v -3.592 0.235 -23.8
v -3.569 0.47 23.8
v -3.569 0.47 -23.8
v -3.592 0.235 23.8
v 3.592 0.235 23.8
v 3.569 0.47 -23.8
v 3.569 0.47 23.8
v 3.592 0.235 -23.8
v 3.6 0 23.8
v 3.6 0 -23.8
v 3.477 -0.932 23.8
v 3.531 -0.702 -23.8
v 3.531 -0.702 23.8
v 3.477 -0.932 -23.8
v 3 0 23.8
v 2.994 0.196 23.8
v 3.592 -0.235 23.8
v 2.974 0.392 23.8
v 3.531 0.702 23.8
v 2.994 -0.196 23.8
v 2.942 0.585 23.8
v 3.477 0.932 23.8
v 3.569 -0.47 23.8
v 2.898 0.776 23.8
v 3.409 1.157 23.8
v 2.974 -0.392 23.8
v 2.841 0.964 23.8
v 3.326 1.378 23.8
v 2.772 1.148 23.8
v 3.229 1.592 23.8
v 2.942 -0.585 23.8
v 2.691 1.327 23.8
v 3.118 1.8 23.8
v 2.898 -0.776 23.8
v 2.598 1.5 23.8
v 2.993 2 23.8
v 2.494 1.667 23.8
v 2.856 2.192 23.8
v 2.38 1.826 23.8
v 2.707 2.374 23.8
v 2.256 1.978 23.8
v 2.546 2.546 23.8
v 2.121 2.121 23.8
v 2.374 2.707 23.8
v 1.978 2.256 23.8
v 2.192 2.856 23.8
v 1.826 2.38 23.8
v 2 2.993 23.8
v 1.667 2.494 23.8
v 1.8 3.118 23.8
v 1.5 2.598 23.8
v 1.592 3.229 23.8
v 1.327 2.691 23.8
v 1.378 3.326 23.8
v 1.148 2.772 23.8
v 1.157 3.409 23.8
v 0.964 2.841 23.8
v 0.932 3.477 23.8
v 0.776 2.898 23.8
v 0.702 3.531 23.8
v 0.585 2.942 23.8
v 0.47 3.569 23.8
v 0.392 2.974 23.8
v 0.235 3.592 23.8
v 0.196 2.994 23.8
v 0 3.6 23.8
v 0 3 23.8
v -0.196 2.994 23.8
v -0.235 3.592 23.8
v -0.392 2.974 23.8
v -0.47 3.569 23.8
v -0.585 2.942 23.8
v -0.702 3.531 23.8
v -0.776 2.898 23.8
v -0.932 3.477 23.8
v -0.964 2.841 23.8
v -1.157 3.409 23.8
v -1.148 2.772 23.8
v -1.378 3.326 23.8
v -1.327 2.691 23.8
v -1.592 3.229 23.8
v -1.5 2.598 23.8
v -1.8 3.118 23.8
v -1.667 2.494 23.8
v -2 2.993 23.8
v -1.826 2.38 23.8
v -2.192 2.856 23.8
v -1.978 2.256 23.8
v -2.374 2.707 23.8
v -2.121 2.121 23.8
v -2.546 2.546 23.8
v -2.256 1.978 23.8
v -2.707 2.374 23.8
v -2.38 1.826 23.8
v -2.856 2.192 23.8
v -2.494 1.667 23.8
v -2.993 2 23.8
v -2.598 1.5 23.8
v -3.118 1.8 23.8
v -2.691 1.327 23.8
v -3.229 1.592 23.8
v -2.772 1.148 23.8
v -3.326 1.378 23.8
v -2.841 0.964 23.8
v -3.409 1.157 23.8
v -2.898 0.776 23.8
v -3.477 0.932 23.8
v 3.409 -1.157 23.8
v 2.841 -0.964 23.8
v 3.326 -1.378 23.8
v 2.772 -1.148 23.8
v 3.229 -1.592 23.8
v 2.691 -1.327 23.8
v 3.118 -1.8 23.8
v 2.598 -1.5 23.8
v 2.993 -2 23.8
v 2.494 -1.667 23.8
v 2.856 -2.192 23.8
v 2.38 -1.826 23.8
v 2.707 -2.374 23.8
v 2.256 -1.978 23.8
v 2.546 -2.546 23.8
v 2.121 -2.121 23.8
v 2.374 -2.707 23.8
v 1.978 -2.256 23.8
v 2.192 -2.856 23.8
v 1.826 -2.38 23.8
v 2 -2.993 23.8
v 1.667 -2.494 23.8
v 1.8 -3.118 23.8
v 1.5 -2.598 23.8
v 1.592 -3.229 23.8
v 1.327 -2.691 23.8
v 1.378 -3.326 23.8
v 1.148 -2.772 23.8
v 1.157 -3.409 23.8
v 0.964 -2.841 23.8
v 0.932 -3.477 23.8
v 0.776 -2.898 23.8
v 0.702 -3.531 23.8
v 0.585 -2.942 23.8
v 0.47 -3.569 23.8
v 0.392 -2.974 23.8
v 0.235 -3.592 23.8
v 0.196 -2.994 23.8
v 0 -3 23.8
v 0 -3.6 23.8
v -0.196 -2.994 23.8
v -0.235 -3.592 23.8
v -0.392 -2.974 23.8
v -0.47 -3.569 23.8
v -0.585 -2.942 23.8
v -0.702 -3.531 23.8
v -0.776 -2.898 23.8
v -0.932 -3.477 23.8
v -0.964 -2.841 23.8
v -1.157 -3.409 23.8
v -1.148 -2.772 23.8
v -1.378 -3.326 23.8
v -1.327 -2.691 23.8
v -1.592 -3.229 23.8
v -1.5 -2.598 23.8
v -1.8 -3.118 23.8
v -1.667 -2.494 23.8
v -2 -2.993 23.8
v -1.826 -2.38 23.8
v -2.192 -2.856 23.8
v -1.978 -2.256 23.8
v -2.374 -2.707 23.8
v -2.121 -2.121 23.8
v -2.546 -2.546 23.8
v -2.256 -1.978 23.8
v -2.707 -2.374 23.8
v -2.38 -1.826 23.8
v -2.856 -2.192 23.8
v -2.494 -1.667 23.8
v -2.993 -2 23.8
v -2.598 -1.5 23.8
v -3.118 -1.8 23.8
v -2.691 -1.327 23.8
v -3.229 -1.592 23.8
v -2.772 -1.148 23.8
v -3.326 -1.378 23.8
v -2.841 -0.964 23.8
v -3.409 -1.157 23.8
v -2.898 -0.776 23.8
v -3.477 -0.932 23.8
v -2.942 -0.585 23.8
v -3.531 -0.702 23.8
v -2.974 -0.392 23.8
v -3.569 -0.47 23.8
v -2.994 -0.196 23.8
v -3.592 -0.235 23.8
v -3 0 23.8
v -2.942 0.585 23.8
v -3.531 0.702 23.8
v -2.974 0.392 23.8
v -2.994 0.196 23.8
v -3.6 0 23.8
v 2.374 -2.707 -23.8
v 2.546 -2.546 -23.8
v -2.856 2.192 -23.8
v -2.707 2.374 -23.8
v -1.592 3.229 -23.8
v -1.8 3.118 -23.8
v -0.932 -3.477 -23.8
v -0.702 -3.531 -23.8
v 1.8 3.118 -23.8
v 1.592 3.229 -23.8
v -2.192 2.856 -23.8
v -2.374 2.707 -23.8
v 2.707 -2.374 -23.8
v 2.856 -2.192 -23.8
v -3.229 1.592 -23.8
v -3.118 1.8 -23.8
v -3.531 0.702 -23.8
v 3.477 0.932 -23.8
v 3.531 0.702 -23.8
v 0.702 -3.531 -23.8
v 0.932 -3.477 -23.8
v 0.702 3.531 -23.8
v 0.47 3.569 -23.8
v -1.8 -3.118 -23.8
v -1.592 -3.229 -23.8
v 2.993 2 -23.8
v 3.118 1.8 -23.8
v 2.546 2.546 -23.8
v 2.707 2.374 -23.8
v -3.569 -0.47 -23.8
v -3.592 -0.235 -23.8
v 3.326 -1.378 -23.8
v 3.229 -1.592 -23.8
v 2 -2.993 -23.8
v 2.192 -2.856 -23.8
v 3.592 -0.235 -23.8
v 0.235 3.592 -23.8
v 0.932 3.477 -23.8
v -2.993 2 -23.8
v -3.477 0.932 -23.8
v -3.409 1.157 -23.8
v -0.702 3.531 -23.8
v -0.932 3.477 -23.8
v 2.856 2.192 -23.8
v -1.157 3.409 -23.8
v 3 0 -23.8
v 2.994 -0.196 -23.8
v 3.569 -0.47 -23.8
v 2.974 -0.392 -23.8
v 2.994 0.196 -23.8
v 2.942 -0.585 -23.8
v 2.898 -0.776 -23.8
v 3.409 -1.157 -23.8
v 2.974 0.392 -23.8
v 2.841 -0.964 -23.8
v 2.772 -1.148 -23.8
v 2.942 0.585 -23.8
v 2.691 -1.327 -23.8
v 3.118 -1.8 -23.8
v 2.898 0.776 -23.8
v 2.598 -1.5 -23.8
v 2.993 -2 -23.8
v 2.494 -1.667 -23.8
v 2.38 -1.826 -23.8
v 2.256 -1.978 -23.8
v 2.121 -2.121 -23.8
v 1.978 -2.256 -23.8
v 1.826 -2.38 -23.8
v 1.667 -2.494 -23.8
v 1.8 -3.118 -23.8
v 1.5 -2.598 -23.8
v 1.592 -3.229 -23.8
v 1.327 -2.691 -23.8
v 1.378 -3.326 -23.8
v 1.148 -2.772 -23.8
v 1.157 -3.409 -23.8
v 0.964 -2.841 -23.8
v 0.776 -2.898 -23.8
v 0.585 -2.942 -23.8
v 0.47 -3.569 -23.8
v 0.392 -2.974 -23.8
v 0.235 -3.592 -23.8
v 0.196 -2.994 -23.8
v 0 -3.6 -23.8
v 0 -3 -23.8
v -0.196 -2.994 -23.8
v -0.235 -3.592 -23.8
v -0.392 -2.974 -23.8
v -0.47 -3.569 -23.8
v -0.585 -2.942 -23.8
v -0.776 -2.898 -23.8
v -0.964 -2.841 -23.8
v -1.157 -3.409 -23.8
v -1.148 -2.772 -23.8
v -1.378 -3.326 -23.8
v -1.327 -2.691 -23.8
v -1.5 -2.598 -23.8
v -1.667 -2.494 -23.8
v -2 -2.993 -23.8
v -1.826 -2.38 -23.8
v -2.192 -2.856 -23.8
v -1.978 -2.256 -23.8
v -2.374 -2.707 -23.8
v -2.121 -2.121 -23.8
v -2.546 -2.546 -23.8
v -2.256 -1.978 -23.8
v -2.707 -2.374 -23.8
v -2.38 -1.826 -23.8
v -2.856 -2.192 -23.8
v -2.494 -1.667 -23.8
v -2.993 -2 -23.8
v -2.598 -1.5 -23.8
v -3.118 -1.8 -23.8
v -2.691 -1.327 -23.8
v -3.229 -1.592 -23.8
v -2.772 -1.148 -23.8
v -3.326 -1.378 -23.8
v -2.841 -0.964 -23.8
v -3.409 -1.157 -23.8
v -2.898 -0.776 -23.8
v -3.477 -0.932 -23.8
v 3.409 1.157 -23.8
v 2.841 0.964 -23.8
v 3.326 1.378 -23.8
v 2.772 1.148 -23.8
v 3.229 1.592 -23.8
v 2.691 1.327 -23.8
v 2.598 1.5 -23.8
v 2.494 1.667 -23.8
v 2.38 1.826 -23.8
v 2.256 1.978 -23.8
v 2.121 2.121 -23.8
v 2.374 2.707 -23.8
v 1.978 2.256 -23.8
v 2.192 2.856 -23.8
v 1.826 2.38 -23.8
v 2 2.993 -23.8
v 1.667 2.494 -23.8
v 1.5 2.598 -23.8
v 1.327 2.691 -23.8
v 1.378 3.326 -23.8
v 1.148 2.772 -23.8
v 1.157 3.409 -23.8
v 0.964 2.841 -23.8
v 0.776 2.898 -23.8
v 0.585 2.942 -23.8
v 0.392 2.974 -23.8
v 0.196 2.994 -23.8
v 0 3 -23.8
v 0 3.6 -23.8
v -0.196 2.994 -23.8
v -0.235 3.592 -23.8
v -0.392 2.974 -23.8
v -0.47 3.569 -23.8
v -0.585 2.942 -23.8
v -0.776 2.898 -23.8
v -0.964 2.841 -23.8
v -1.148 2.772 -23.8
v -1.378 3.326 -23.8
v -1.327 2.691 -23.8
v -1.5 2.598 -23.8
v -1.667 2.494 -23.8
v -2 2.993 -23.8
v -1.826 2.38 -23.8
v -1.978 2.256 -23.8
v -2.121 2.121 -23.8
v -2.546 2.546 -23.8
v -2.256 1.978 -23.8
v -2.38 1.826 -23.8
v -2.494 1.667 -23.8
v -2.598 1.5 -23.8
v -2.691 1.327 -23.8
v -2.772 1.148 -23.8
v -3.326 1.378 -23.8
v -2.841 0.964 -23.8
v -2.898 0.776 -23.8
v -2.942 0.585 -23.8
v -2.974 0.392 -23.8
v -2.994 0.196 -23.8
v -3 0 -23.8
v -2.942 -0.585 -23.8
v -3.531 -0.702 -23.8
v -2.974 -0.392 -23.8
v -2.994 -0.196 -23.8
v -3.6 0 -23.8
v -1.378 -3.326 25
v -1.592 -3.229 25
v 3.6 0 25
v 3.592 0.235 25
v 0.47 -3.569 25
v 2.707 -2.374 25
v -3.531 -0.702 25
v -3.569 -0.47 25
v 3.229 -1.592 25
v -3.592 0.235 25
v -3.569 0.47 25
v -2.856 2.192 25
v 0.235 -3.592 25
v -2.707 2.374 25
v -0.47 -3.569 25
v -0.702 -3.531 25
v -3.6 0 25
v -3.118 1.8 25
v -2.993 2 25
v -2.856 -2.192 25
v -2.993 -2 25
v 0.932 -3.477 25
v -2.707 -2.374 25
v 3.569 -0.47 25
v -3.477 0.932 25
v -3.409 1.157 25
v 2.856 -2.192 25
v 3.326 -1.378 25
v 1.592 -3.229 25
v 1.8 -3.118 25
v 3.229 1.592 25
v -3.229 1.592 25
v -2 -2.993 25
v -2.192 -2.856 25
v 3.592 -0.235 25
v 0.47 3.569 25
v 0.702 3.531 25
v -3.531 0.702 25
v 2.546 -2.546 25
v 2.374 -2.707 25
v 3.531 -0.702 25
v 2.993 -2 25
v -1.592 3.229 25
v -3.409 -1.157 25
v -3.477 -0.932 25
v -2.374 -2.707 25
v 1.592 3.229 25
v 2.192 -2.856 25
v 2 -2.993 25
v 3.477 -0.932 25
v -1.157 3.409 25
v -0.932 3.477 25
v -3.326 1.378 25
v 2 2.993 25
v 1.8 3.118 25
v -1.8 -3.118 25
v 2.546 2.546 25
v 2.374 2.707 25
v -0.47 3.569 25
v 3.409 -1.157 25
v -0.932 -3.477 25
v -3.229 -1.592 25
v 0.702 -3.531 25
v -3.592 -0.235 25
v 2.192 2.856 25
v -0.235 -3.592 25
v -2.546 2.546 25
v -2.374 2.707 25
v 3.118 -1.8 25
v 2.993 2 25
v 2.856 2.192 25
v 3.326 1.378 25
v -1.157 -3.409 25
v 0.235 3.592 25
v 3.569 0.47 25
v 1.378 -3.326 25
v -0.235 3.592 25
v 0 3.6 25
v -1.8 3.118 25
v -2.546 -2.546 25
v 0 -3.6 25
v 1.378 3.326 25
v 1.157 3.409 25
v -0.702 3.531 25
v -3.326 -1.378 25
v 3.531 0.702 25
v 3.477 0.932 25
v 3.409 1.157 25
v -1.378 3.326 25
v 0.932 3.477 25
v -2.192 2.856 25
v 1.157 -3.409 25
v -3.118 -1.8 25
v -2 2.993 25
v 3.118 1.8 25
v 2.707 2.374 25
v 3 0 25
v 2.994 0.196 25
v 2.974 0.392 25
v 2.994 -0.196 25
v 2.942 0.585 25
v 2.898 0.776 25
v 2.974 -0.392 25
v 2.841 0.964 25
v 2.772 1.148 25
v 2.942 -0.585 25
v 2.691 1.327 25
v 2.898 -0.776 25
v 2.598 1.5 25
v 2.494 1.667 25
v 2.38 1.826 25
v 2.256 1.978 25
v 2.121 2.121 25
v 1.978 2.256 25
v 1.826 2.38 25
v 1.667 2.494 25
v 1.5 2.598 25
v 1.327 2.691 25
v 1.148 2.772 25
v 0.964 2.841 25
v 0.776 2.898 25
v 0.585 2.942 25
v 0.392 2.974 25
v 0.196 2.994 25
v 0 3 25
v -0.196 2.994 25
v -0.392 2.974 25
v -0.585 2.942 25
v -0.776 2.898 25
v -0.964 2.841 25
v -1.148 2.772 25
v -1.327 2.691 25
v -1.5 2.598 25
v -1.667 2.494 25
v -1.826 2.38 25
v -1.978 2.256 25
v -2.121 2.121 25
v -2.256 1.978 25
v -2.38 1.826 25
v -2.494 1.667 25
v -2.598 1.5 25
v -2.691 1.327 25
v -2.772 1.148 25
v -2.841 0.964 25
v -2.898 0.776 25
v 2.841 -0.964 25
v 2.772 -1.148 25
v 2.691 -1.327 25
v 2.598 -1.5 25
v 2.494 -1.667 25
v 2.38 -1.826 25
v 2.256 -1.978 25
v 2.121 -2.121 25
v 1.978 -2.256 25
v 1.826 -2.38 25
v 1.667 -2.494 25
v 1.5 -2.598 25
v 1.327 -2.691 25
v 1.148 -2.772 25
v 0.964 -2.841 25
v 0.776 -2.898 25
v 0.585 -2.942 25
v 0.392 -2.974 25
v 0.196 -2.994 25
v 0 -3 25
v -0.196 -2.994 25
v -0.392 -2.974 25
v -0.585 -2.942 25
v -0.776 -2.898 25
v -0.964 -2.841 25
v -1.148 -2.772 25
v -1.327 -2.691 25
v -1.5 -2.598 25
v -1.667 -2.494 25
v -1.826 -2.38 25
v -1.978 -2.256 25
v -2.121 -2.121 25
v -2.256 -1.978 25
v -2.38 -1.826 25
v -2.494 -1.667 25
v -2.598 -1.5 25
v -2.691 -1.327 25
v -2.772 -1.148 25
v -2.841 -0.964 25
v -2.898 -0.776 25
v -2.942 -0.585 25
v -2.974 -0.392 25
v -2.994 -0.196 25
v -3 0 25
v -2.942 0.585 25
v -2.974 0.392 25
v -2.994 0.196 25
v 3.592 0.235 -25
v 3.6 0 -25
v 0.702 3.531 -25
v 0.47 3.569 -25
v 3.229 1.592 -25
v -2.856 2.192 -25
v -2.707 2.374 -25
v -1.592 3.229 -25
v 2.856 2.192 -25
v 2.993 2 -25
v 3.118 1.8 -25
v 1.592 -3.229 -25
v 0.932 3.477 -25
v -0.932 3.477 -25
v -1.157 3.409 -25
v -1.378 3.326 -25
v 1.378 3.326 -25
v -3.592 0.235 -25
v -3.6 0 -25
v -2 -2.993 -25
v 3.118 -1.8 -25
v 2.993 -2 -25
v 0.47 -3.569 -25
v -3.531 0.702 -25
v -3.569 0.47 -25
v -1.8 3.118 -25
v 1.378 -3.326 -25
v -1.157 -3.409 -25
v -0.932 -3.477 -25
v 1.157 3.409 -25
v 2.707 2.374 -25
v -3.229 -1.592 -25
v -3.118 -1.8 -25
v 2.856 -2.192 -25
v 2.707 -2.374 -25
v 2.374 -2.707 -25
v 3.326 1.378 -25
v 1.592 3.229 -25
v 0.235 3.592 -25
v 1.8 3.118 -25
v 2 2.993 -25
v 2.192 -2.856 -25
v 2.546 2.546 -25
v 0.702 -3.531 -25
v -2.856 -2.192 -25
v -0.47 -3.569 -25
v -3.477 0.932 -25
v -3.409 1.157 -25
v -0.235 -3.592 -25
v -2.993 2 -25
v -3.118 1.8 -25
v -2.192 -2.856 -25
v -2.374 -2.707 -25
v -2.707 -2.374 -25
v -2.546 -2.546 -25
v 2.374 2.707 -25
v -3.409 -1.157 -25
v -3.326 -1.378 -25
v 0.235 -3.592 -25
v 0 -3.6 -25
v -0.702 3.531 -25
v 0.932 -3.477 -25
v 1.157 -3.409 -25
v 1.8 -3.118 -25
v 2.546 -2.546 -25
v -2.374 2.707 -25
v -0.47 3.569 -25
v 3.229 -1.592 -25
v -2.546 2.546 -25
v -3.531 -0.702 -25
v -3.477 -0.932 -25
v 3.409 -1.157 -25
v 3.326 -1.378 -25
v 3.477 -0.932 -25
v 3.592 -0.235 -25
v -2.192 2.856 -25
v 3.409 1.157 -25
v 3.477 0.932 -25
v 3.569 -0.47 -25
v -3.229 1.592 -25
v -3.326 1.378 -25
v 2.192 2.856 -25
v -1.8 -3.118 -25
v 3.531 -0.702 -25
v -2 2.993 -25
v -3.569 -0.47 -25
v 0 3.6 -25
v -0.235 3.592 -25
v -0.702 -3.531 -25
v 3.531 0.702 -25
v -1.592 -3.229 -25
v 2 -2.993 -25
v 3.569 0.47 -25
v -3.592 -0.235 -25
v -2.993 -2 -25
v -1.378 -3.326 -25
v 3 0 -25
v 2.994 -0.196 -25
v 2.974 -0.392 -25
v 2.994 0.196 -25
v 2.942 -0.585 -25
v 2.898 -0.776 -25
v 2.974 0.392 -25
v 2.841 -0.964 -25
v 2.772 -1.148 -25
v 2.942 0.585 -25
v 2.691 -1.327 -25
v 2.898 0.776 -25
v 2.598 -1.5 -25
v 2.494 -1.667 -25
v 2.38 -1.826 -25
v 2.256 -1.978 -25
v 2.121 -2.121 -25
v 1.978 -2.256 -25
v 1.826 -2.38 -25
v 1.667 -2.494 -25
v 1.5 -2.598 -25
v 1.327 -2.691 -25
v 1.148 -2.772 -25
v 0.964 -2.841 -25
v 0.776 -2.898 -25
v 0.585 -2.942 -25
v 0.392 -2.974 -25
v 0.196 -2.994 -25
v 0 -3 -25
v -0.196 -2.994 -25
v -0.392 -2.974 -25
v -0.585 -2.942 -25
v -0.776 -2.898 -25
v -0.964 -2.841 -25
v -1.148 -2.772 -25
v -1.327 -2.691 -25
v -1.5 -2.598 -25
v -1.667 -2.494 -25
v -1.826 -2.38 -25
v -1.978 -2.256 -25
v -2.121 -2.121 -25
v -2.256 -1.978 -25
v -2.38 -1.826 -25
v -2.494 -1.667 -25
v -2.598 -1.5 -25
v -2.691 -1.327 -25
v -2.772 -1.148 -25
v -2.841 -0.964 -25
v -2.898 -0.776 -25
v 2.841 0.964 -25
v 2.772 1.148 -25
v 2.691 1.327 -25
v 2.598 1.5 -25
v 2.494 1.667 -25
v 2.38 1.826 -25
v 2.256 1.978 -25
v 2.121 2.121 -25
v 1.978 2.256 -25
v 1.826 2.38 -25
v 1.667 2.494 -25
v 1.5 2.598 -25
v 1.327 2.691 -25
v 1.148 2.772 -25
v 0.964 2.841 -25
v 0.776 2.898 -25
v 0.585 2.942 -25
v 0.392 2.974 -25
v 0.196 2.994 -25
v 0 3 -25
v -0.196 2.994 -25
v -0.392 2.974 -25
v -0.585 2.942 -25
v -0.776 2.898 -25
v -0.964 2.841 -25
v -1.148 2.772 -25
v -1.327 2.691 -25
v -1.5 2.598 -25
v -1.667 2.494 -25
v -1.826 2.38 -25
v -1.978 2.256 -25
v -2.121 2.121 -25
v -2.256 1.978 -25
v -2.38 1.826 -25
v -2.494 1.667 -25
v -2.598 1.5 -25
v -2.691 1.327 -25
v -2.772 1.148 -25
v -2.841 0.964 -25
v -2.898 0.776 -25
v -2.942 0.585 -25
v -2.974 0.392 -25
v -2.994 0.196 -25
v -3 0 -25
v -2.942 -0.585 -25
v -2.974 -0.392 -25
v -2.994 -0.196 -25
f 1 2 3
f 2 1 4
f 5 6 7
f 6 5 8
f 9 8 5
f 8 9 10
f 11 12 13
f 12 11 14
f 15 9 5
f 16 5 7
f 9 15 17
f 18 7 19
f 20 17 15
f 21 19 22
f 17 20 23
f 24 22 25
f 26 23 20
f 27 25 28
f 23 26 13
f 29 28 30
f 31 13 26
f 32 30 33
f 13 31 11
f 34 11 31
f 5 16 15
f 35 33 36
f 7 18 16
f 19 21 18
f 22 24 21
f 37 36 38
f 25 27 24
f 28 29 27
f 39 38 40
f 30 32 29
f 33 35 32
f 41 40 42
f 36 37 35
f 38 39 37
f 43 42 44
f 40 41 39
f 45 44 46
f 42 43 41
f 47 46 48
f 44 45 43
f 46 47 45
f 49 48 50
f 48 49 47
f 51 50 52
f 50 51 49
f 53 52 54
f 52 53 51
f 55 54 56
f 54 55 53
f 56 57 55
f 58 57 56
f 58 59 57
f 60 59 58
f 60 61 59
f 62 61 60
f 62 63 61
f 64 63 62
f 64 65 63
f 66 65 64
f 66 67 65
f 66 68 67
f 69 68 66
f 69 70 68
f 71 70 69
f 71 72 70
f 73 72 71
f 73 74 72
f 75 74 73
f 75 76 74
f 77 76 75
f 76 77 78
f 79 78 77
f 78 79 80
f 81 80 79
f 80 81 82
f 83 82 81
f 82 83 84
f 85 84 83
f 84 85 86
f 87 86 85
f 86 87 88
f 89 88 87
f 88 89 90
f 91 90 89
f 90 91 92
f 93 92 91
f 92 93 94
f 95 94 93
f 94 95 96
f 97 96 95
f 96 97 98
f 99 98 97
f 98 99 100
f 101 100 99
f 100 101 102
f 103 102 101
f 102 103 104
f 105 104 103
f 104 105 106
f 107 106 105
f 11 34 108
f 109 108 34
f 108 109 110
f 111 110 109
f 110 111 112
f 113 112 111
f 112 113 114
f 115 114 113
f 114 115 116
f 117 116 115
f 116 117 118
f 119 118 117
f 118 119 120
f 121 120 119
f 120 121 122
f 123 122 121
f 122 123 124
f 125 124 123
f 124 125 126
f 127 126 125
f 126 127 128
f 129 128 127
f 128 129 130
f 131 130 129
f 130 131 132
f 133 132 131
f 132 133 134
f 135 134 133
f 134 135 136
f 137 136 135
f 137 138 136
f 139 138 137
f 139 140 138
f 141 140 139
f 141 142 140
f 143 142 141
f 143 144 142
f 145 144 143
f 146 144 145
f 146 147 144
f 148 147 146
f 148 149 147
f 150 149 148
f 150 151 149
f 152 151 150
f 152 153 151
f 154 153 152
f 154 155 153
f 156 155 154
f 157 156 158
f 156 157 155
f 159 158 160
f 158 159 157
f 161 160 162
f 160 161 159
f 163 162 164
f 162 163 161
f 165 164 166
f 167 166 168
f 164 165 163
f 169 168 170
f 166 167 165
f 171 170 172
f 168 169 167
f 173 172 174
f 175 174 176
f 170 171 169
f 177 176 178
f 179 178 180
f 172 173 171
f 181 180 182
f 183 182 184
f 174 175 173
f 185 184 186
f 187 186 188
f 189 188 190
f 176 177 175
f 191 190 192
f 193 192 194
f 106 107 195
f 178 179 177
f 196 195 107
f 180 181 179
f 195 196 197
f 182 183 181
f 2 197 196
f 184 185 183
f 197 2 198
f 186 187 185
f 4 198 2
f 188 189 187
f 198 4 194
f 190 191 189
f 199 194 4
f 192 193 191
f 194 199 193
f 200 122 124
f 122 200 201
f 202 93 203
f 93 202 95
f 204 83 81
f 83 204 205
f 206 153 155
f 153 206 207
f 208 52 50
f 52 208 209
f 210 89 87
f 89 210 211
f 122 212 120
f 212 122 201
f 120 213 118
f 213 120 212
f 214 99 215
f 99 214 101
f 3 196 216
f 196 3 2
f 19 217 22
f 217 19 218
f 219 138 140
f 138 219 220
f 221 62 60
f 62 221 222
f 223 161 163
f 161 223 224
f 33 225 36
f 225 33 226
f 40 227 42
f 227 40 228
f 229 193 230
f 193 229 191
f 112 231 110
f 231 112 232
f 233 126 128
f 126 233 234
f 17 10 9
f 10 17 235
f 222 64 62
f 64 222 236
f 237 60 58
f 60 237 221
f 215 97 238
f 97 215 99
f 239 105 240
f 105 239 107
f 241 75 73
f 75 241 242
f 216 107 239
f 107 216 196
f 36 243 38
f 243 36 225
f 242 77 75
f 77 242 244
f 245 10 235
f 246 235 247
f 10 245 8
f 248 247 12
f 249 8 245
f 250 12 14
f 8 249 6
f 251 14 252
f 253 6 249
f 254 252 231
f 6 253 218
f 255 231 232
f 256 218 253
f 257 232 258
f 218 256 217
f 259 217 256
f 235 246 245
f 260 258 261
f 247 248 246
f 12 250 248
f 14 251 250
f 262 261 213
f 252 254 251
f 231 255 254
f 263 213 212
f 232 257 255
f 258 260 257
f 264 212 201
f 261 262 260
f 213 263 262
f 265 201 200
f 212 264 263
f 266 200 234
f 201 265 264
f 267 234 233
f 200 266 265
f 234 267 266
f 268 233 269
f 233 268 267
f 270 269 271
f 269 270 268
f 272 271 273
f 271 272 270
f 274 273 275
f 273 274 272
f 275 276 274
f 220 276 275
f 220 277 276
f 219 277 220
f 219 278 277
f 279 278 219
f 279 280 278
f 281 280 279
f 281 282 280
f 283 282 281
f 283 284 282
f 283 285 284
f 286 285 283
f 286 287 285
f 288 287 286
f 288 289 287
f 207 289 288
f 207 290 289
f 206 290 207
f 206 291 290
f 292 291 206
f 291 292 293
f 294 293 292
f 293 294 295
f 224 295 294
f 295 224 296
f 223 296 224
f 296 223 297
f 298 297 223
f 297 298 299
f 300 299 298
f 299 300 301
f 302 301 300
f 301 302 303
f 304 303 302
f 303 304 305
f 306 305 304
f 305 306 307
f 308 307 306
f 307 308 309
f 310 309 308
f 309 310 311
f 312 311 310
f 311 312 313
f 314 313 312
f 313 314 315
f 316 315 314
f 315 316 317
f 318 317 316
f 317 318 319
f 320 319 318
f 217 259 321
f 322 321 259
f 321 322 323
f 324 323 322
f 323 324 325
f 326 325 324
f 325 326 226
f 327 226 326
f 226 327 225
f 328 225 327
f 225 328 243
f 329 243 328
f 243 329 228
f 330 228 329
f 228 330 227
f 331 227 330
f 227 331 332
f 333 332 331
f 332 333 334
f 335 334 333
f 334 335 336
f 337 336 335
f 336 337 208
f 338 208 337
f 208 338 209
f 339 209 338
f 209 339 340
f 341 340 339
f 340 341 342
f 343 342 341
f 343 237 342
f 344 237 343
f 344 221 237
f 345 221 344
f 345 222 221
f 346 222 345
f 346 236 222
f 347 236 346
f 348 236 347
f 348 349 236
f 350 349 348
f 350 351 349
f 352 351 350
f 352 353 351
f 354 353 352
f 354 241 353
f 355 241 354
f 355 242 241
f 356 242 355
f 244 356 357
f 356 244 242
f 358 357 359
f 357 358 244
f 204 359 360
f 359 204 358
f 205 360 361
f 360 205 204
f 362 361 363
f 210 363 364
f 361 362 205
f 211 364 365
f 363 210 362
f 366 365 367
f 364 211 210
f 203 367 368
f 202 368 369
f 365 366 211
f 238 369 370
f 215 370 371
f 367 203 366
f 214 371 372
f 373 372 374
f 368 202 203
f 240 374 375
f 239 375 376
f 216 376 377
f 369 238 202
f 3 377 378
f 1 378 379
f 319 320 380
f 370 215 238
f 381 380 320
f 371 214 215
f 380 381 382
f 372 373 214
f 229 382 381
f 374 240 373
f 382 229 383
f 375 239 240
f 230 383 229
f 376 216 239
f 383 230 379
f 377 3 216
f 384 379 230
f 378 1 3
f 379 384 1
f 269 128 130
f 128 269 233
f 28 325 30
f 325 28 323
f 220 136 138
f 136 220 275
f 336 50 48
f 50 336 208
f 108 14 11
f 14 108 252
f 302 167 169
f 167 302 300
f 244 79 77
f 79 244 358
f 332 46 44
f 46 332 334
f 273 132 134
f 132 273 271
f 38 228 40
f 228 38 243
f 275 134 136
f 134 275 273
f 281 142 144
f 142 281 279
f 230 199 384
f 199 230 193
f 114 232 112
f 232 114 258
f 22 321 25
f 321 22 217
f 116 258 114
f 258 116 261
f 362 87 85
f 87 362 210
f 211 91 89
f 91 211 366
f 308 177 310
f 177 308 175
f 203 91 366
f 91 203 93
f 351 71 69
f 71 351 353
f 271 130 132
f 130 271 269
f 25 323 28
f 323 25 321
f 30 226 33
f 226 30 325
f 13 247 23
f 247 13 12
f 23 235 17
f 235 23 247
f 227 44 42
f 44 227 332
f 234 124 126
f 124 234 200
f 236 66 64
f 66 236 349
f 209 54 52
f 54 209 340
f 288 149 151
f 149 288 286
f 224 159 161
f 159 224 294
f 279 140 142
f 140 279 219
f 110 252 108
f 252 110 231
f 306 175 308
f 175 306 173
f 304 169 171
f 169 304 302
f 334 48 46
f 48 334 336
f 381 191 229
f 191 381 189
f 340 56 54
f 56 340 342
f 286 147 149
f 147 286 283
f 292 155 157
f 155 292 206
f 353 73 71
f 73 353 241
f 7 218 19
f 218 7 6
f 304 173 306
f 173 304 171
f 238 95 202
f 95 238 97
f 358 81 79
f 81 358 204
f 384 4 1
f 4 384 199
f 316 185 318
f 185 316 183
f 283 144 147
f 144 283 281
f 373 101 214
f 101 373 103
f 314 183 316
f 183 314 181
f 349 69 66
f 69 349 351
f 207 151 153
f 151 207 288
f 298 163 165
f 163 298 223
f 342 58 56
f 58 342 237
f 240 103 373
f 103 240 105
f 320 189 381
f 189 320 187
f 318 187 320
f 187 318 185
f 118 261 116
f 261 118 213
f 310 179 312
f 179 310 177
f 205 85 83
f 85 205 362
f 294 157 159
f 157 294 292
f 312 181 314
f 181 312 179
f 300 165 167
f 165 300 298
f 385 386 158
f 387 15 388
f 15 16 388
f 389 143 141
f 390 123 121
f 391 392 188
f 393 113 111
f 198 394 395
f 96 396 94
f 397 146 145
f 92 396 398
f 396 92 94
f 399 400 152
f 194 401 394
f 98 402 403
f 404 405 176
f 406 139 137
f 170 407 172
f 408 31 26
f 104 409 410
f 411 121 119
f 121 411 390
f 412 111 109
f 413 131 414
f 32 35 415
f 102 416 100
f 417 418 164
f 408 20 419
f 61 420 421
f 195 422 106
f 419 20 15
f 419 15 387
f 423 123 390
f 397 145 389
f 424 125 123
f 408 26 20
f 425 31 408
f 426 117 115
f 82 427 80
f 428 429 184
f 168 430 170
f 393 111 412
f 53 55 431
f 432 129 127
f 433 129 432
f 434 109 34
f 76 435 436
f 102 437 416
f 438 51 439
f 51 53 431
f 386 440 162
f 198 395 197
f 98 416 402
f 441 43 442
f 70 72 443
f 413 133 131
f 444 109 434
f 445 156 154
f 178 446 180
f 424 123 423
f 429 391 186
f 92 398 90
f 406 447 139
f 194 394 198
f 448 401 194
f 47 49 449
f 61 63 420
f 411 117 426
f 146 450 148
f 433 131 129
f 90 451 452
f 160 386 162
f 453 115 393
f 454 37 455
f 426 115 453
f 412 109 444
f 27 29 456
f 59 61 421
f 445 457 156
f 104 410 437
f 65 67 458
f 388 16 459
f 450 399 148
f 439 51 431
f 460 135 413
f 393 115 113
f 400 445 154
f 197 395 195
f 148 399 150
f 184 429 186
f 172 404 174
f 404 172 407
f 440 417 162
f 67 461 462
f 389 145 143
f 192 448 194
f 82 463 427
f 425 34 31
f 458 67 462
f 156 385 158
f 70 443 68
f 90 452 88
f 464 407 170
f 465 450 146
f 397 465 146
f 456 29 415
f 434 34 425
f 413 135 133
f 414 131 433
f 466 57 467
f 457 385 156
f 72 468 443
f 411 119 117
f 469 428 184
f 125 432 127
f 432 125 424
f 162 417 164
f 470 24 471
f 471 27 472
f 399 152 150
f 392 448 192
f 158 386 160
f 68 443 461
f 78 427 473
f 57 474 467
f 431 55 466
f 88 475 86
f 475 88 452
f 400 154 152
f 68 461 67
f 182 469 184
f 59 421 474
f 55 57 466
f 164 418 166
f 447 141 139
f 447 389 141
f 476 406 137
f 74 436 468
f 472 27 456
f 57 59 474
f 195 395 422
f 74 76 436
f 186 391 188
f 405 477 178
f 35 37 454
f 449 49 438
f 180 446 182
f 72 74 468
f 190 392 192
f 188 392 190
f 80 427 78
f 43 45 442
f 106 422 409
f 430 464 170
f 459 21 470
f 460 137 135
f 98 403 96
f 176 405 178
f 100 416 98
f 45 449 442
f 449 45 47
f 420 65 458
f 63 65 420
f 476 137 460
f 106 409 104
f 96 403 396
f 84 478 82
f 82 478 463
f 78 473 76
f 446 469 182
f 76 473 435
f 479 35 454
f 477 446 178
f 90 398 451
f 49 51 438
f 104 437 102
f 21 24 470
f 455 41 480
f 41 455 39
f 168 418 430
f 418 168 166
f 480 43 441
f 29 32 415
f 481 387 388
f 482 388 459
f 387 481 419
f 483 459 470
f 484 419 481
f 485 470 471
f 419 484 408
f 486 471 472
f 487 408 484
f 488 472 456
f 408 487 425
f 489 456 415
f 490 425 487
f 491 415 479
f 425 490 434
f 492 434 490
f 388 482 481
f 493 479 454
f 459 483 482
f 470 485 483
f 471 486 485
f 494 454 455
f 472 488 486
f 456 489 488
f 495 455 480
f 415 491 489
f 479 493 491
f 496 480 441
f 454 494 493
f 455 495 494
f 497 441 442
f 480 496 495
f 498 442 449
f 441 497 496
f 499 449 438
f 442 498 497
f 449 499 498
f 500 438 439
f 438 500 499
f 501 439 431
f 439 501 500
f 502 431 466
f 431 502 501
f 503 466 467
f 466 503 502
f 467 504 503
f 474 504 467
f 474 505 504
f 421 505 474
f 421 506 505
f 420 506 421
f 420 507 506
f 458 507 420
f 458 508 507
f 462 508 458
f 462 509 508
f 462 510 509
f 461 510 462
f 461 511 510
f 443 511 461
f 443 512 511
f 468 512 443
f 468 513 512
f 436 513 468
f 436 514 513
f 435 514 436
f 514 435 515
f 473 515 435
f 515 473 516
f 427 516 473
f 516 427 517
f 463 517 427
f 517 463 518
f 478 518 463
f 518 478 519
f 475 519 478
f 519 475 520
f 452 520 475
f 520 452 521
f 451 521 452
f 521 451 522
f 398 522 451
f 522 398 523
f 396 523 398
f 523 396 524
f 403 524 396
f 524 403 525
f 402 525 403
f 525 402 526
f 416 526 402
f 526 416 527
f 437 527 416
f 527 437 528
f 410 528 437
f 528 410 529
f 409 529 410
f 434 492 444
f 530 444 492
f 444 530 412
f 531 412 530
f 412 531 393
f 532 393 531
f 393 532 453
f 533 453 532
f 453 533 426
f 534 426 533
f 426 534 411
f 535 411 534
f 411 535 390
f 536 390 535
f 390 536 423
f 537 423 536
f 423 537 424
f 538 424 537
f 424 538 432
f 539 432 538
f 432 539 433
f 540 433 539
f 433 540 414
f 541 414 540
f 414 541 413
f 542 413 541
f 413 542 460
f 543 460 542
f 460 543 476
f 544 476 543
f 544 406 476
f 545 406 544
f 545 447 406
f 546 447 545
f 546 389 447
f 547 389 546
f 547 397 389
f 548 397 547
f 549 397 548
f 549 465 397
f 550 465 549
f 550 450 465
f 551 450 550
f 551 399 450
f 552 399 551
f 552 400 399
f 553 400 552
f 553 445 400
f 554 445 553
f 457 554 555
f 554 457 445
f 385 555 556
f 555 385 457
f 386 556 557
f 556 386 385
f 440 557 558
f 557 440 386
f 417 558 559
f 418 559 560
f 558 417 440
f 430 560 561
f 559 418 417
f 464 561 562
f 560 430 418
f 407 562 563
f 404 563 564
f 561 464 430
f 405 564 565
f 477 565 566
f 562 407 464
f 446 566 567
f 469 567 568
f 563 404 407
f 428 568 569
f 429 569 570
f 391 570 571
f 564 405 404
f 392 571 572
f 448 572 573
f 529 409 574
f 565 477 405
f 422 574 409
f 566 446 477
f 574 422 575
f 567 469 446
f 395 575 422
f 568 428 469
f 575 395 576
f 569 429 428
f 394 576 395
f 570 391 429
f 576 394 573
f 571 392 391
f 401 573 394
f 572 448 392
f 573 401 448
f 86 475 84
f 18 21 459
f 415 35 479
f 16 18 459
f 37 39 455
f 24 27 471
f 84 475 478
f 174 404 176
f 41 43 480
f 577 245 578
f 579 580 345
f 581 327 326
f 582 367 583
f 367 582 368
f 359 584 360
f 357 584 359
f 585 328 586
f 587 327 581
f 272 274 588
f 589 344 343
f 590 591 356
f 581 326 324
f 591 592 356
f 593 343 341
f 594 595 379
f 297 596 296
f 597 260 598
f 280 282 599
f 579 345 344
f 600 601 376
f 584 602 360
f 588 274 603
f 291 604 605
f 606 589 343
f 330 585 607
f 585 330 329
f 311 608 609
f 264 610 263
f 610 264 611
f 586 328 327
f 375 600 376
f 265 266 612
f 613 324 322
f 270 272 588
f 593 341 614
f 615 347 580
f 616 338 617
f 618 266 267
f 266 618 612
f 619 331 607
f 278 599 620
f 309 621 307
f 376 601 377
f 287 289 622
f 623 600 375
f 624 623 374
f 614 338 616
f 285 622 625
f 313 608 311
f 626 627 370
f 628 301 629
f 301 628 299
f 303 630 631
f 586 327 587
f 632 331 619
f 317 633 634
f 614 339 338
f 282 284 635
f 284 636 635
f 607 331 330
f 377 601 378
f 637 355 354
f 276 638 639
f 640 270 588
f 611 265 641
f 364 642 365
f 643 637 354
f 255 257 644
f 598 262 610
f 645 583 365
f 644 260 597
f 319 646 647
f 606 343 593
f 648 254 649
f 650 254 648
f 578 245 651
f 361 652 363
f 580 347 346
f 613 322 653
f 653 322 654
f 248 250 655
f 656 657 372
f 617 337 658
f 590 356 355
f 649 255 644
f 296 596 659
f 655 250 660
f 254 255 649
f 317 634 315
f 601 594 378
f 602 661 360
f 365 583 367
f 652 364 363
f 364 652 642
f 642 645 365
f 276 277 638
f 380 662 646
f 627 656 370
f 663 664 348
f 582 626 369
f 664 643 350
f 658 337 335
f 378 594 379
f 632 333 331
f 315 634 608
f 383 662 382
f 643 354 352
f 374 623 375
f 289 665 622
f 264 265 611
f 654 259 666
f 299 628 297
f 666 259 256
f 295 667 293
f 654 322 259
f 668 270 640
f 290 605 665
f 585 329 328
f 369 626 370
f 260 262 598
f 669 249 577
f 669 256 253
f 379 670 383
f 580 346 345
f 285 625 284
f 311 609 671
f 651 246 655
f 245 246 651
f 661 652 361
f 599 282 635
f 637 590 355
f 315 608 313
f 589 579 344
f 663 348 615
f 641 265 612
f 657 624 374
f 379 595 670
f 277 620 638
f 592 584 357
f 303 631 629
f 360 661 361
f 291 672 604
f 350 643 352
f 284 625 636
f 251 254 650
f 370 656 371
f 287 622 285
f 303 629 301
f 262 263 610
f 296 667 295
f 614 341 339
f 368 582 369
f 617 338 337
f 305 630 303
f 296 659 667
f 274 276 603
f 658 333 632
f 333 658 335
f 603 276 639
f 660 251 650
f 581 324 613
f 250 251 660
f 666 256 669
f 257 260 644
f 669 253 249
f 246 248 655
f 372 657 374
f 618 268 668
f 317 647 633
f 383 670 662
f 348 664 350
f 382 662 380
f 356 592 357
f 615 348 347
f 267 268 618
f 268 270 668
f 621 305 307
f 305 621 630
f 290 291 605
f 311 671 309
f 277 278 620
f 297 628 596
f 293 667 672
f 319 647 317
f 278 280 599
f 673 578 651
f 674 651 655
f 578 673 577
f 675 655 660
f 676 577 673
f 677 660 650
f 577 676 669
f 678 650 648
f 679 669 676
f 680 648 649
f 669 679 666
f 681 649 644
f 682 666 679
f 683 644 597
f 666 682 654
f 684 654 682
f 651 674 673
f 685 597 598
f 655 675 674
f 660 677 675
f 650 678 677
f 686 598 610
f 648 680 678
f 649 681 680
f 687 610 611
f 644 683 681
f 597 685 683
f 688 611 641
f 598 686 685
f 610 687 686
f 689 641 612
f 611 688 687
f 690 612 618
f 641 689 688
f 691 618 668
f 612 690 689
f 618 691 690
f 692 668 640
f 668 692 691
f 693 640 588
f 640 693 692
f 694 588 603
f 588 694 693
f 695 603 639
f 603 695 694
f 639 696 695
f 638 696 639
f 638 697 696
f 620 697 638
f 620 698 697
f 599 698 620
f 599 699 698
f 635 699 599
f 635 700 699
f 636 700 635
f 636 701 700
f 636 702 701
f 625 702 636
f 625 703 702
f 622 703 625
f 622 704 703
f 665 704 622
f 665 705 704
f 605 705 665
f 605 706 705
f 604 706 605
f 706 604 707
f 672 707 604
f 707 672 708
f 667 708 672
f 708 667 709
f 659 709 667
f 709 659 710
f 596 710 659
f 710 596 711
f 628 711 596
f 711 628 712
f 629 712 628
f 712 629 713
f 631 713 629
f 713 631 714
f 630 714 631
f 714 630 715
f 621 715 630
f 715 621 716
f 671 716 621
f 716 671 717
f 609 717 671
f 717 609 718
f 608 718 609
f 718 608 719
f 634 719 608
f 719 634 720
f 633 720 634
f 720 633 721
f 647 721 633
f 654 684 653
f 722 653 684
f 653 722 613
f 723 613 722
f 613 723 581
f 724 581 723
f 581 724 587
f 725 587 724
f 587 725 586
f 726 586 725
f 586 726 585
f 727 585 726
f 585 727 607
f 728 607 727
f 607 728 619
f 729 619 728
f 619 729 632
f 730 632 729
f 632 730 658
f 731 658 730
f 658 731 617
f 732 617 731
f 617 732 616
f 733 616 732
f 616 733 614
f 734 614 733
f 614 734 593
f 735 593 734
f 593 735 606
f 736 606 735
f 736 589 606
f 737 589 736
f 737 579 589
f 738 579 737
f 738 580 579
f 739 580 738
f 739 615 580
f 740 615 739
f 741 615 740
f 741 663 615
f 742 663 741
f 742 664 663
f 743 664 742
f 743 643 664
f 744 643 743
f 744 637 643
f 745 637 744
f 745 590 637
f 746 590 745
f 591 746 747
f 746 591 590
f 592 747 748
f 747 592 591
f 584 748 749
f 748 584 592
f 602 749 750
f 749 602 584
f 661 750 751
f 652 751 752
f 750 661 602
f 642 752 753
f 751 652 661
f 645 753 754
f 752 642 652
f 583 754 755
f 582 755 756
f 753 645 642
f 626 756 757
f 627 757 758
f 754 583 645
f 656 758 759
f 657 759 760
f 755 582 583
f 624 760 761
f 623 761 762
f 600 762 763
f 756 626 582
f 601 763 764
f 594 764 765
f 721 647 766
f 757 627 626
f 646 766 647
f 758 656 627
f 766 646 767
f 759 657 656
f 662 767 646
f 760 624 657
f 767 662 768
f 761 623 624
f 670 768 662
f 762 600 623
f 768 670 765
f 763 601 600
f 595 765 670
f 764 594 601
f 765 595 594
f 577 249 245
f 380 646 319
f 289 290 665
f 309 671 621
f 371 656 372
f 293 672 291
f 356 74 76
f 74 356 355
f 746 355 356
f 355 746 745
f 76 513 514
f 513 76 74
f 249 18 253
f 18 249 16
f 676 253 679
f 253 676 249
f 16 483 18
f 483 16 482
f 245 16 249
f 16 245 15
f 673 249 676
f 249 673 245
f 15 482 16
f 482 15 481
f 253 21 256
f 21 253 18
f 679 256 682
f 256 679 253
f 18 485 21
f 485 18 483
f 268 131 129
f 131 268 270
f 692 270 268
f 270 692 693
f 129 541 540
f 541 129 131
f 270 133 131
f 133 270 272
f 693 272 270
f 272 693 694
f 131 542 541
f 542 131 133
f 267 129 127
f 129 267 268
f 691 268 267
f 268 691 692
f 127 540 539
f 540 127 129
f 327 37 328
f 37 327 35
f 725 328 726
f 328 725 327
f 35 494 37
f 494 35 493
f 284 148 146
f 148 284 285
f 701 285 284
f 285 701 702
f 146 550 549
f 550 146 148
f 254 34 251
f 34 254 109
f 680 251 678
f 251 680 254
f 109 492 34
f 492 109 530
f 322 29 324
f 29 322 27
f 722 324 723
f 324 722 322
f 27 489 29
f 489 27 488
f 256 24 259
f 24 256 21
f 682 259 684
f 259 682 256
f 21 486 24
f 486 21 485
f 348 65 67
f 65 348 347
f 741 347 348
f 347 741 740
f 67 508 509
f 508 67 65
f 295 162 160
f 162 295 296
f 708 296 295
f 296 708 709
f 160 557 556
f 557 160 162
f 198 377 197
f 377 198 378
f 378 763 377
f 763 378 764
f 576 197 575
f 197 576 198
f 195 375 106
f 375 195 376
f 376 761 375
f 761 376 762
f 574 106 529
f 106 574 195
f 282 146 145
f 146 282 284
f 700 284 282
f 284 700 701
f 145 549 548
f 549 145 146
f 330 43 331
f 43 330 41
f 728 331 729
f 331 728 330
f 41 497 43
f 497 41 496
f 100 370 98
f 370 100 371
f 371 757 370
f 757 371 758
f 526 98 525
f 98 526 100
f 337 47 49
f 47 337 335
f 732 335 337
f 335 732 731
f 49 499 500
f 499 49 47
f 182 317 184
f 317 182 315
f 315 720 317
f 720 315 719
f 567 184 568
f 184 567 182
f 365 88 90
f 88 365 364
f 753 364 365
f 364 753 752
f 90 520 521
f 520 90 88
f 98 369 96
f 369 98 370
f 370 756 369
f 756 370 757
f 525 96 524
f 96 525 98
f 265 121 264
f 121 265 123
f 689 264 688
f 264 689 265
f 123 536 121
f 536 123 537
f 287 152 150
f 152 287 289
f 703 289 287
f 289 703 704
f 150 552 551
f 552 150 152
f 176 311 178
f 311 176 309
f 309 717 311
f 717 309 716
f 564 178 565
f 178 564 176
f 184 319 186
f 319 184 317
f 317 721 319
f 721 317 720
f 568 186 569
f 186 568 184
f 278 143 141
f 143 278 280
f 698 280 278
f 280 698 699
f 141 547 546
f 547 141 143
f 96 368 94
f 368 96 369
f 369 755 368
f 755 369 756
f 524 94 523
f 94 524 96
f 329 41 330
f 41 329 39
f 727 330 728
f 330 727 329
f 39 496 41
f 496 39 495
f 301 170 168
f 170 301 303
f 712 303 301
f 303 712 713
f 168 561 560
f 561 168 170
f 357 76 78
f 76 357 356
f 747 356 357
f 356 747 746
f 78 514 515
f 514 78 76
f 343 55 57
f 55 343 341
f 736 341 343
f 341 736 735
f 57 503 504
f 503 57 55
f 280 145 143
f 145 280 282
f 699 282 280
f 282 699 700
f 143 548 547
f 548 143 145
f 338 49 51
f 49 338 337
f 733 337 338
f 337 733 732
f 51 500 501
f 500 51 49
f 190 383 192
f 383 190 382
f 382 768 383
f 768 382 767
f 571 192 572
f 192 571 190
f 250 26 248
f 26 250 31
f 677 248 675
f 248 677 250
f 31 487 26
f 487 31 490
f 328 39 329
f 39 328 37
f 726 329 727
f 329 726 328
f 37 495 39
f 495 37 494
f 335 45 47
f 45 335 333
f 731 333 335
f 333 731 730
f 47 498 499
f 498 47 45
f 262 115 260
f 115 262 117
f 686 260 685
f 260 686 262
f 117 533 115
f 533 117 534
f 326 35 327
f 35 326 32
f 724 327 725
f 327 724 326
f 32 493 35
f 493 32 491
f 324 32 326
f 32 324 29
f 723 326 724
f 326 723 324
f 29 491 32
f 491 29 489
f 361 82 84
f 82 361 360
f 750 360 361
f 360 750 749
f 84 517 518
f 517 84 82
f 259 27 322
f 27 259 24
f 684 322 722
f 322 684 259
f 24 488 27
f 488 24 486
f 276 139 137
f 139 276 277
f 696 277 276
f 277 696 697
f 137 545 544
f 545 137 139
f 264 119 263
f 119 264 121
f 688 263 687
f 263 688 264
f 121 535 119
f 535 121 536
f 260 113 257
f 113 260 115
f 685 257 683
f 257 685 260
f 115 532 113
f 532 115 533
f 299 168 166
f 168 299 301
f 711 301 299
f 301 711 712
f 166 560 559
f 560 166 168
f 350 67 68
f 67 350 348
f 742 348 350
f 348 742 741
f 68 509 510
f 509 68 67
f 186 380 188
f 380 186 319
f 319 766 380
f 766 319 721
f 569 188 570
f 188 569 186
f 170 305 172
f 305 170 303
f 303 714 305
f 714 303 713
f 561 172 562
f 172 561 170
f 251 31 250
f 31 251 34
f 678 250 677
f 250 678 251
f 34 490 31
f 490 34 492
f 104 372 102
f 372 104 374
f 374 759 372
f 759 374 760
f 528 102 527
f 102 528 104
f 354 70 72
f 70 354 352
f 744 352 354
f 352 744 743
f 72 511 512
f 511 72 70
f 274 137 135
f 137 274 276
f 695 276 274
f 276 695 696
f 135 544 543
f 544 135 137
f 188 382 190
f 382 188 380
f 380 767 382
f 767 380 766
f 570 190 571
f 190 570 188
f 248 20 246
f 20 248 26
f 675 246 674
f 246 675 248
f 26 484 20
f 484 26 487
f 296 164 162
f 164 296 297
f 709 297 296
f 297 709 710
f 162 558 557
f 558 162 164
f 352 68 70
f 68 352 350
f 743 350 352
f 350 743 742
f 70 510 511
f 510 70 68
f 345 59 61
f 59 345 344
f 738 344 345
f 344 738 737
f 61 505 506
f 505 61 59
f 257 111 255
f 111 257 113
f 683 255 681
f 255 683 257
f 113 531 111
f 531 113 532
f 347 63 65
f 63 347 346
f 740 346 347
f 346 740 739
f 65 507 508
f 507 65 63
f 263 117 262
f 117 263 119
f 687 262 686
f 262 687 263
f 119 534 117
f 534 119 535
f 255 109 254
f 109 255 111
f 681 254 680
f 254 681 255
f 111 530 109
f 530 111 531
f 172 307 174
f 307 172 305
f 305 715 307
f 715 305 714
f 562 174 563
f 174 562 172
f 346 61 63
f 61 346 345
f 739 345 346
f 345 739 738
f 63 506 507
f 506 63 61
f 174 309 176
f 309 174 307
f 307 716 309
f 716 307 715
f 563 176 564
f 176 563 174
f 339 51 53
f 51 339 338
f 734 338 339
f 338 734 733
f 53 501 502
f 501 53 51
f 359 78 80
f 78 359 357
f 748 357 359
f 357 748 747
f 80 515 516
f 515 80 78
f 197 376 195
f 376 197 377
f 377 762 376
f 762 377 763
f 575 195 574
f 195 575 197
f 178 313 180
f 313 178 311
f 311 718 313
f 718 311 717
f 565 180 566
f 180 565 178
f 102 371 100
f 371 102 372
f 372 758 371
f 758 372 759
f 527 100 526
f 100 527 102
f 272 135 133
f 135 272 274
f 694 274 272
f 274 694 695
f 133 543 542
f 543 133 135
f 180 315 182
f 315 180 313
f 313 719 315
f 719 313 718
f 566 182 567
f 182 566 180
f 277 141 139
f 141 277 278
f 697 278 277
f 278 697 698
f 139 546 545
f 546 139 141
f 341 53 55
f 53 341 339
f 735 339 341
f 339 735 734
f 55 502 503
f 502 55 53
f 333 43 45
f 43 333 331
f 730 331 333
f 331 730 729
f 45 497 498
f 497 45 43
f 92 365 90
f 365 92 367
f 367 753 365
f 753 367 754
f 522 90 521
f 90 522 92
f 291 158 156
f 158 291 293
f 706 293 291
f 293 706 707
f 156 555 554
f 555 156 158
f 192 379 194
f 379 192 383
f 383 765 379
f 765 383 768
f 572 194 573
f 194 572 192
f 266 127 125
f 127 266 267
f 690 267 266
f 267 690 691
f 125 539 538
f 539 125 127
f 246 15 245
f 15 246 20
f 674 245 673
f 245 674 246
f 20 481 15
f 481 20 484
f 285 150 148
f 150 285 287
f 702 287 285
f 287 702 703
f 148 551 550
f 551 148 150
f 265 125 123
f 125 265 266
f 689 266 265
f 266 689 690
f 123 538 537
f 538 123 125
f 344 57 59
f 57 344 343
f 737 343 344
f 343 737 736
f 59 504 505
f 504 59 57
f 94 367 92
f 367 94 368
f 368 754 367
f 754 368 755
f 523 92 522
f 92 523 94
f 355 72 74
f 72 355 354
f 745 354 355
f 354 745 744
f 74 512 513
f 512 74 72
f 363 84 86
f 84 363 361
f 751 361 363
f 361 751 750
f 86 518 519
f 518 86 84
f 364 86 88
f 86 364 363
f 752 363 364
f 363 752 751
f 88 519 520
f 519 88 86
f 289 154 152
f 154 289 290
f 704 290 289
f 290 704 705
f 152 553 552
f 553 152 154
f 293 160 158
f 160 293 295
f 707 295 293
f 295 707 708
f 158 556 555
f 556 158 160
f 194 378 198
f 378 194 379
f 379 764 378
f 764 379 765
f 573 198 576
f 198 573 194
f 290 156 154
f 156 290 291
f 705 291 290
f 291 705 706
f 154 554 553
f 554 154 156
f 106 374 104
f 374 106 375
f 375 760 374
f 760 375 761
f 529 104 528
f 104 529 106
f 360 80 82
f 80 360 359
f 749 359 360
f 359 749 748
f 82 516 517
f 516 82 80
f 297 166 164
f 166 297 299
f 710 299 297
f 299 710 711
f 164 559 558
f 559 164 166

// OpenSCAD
// Heatshrink sleeving: simple hollow tube (single connected solid)

// Parameters
sleeve_length   = 50;   //[25:100:1]
inner_diameter  = 6;    //[3:12:0.1]
wall_thickness  = 0.6;  //[0.3:1.2:0.05]
outer_diameter  = 7.2;  //[3.6:14.4:0.1]
chamfer_length  = 1.2;  //[0.6:2.4:0.1]
chamfer_radial  = 0.6;  //[0.3:1.2:0.05]
connect_overlap = 0.2;  //[0.05:1:0.05]

// Derived (keep consistent if user edits either OD or wall)
od = outer_diameter;
id_from_wall = od - 2*wall_thickness;
id = min(inner_diameter, id_from_wall);
id_safe = max(0.01, id);

$fn = 96;

module heatshrink_sleeve() {
  difference() {
    // Outer tube with slight end chamfers
    union() {
      // Main outer cylinder (shortened to make room for chamfers)
      cylinder(h = sleeve_length - 2*chamfer_length, r = od/2, center = true);

      // Top chamfer
      translate([0, 0, (sleeve_length/2 - chamfer_length/2)])
        cylinder(h = chamfer_length, r1 = od/2 - chamfer_radial, r2 = od/2, center = true);

      // Bottom chamfer
      translate([0, 0, -(sleeve_length/2 - chamfer_length/2)])
        cylinder(h = chamfer_length, r1 = od/2, r2 = od/2 - chamfer_radial, center = true);
    }

    // Inner bore (slightly longer to guarantee clean subtraction)
    cylinder(h = sleeve_length + 2*connect_overlap, r = id_safe/2, center = true);
  }
}

heatshrink_sleeve();
